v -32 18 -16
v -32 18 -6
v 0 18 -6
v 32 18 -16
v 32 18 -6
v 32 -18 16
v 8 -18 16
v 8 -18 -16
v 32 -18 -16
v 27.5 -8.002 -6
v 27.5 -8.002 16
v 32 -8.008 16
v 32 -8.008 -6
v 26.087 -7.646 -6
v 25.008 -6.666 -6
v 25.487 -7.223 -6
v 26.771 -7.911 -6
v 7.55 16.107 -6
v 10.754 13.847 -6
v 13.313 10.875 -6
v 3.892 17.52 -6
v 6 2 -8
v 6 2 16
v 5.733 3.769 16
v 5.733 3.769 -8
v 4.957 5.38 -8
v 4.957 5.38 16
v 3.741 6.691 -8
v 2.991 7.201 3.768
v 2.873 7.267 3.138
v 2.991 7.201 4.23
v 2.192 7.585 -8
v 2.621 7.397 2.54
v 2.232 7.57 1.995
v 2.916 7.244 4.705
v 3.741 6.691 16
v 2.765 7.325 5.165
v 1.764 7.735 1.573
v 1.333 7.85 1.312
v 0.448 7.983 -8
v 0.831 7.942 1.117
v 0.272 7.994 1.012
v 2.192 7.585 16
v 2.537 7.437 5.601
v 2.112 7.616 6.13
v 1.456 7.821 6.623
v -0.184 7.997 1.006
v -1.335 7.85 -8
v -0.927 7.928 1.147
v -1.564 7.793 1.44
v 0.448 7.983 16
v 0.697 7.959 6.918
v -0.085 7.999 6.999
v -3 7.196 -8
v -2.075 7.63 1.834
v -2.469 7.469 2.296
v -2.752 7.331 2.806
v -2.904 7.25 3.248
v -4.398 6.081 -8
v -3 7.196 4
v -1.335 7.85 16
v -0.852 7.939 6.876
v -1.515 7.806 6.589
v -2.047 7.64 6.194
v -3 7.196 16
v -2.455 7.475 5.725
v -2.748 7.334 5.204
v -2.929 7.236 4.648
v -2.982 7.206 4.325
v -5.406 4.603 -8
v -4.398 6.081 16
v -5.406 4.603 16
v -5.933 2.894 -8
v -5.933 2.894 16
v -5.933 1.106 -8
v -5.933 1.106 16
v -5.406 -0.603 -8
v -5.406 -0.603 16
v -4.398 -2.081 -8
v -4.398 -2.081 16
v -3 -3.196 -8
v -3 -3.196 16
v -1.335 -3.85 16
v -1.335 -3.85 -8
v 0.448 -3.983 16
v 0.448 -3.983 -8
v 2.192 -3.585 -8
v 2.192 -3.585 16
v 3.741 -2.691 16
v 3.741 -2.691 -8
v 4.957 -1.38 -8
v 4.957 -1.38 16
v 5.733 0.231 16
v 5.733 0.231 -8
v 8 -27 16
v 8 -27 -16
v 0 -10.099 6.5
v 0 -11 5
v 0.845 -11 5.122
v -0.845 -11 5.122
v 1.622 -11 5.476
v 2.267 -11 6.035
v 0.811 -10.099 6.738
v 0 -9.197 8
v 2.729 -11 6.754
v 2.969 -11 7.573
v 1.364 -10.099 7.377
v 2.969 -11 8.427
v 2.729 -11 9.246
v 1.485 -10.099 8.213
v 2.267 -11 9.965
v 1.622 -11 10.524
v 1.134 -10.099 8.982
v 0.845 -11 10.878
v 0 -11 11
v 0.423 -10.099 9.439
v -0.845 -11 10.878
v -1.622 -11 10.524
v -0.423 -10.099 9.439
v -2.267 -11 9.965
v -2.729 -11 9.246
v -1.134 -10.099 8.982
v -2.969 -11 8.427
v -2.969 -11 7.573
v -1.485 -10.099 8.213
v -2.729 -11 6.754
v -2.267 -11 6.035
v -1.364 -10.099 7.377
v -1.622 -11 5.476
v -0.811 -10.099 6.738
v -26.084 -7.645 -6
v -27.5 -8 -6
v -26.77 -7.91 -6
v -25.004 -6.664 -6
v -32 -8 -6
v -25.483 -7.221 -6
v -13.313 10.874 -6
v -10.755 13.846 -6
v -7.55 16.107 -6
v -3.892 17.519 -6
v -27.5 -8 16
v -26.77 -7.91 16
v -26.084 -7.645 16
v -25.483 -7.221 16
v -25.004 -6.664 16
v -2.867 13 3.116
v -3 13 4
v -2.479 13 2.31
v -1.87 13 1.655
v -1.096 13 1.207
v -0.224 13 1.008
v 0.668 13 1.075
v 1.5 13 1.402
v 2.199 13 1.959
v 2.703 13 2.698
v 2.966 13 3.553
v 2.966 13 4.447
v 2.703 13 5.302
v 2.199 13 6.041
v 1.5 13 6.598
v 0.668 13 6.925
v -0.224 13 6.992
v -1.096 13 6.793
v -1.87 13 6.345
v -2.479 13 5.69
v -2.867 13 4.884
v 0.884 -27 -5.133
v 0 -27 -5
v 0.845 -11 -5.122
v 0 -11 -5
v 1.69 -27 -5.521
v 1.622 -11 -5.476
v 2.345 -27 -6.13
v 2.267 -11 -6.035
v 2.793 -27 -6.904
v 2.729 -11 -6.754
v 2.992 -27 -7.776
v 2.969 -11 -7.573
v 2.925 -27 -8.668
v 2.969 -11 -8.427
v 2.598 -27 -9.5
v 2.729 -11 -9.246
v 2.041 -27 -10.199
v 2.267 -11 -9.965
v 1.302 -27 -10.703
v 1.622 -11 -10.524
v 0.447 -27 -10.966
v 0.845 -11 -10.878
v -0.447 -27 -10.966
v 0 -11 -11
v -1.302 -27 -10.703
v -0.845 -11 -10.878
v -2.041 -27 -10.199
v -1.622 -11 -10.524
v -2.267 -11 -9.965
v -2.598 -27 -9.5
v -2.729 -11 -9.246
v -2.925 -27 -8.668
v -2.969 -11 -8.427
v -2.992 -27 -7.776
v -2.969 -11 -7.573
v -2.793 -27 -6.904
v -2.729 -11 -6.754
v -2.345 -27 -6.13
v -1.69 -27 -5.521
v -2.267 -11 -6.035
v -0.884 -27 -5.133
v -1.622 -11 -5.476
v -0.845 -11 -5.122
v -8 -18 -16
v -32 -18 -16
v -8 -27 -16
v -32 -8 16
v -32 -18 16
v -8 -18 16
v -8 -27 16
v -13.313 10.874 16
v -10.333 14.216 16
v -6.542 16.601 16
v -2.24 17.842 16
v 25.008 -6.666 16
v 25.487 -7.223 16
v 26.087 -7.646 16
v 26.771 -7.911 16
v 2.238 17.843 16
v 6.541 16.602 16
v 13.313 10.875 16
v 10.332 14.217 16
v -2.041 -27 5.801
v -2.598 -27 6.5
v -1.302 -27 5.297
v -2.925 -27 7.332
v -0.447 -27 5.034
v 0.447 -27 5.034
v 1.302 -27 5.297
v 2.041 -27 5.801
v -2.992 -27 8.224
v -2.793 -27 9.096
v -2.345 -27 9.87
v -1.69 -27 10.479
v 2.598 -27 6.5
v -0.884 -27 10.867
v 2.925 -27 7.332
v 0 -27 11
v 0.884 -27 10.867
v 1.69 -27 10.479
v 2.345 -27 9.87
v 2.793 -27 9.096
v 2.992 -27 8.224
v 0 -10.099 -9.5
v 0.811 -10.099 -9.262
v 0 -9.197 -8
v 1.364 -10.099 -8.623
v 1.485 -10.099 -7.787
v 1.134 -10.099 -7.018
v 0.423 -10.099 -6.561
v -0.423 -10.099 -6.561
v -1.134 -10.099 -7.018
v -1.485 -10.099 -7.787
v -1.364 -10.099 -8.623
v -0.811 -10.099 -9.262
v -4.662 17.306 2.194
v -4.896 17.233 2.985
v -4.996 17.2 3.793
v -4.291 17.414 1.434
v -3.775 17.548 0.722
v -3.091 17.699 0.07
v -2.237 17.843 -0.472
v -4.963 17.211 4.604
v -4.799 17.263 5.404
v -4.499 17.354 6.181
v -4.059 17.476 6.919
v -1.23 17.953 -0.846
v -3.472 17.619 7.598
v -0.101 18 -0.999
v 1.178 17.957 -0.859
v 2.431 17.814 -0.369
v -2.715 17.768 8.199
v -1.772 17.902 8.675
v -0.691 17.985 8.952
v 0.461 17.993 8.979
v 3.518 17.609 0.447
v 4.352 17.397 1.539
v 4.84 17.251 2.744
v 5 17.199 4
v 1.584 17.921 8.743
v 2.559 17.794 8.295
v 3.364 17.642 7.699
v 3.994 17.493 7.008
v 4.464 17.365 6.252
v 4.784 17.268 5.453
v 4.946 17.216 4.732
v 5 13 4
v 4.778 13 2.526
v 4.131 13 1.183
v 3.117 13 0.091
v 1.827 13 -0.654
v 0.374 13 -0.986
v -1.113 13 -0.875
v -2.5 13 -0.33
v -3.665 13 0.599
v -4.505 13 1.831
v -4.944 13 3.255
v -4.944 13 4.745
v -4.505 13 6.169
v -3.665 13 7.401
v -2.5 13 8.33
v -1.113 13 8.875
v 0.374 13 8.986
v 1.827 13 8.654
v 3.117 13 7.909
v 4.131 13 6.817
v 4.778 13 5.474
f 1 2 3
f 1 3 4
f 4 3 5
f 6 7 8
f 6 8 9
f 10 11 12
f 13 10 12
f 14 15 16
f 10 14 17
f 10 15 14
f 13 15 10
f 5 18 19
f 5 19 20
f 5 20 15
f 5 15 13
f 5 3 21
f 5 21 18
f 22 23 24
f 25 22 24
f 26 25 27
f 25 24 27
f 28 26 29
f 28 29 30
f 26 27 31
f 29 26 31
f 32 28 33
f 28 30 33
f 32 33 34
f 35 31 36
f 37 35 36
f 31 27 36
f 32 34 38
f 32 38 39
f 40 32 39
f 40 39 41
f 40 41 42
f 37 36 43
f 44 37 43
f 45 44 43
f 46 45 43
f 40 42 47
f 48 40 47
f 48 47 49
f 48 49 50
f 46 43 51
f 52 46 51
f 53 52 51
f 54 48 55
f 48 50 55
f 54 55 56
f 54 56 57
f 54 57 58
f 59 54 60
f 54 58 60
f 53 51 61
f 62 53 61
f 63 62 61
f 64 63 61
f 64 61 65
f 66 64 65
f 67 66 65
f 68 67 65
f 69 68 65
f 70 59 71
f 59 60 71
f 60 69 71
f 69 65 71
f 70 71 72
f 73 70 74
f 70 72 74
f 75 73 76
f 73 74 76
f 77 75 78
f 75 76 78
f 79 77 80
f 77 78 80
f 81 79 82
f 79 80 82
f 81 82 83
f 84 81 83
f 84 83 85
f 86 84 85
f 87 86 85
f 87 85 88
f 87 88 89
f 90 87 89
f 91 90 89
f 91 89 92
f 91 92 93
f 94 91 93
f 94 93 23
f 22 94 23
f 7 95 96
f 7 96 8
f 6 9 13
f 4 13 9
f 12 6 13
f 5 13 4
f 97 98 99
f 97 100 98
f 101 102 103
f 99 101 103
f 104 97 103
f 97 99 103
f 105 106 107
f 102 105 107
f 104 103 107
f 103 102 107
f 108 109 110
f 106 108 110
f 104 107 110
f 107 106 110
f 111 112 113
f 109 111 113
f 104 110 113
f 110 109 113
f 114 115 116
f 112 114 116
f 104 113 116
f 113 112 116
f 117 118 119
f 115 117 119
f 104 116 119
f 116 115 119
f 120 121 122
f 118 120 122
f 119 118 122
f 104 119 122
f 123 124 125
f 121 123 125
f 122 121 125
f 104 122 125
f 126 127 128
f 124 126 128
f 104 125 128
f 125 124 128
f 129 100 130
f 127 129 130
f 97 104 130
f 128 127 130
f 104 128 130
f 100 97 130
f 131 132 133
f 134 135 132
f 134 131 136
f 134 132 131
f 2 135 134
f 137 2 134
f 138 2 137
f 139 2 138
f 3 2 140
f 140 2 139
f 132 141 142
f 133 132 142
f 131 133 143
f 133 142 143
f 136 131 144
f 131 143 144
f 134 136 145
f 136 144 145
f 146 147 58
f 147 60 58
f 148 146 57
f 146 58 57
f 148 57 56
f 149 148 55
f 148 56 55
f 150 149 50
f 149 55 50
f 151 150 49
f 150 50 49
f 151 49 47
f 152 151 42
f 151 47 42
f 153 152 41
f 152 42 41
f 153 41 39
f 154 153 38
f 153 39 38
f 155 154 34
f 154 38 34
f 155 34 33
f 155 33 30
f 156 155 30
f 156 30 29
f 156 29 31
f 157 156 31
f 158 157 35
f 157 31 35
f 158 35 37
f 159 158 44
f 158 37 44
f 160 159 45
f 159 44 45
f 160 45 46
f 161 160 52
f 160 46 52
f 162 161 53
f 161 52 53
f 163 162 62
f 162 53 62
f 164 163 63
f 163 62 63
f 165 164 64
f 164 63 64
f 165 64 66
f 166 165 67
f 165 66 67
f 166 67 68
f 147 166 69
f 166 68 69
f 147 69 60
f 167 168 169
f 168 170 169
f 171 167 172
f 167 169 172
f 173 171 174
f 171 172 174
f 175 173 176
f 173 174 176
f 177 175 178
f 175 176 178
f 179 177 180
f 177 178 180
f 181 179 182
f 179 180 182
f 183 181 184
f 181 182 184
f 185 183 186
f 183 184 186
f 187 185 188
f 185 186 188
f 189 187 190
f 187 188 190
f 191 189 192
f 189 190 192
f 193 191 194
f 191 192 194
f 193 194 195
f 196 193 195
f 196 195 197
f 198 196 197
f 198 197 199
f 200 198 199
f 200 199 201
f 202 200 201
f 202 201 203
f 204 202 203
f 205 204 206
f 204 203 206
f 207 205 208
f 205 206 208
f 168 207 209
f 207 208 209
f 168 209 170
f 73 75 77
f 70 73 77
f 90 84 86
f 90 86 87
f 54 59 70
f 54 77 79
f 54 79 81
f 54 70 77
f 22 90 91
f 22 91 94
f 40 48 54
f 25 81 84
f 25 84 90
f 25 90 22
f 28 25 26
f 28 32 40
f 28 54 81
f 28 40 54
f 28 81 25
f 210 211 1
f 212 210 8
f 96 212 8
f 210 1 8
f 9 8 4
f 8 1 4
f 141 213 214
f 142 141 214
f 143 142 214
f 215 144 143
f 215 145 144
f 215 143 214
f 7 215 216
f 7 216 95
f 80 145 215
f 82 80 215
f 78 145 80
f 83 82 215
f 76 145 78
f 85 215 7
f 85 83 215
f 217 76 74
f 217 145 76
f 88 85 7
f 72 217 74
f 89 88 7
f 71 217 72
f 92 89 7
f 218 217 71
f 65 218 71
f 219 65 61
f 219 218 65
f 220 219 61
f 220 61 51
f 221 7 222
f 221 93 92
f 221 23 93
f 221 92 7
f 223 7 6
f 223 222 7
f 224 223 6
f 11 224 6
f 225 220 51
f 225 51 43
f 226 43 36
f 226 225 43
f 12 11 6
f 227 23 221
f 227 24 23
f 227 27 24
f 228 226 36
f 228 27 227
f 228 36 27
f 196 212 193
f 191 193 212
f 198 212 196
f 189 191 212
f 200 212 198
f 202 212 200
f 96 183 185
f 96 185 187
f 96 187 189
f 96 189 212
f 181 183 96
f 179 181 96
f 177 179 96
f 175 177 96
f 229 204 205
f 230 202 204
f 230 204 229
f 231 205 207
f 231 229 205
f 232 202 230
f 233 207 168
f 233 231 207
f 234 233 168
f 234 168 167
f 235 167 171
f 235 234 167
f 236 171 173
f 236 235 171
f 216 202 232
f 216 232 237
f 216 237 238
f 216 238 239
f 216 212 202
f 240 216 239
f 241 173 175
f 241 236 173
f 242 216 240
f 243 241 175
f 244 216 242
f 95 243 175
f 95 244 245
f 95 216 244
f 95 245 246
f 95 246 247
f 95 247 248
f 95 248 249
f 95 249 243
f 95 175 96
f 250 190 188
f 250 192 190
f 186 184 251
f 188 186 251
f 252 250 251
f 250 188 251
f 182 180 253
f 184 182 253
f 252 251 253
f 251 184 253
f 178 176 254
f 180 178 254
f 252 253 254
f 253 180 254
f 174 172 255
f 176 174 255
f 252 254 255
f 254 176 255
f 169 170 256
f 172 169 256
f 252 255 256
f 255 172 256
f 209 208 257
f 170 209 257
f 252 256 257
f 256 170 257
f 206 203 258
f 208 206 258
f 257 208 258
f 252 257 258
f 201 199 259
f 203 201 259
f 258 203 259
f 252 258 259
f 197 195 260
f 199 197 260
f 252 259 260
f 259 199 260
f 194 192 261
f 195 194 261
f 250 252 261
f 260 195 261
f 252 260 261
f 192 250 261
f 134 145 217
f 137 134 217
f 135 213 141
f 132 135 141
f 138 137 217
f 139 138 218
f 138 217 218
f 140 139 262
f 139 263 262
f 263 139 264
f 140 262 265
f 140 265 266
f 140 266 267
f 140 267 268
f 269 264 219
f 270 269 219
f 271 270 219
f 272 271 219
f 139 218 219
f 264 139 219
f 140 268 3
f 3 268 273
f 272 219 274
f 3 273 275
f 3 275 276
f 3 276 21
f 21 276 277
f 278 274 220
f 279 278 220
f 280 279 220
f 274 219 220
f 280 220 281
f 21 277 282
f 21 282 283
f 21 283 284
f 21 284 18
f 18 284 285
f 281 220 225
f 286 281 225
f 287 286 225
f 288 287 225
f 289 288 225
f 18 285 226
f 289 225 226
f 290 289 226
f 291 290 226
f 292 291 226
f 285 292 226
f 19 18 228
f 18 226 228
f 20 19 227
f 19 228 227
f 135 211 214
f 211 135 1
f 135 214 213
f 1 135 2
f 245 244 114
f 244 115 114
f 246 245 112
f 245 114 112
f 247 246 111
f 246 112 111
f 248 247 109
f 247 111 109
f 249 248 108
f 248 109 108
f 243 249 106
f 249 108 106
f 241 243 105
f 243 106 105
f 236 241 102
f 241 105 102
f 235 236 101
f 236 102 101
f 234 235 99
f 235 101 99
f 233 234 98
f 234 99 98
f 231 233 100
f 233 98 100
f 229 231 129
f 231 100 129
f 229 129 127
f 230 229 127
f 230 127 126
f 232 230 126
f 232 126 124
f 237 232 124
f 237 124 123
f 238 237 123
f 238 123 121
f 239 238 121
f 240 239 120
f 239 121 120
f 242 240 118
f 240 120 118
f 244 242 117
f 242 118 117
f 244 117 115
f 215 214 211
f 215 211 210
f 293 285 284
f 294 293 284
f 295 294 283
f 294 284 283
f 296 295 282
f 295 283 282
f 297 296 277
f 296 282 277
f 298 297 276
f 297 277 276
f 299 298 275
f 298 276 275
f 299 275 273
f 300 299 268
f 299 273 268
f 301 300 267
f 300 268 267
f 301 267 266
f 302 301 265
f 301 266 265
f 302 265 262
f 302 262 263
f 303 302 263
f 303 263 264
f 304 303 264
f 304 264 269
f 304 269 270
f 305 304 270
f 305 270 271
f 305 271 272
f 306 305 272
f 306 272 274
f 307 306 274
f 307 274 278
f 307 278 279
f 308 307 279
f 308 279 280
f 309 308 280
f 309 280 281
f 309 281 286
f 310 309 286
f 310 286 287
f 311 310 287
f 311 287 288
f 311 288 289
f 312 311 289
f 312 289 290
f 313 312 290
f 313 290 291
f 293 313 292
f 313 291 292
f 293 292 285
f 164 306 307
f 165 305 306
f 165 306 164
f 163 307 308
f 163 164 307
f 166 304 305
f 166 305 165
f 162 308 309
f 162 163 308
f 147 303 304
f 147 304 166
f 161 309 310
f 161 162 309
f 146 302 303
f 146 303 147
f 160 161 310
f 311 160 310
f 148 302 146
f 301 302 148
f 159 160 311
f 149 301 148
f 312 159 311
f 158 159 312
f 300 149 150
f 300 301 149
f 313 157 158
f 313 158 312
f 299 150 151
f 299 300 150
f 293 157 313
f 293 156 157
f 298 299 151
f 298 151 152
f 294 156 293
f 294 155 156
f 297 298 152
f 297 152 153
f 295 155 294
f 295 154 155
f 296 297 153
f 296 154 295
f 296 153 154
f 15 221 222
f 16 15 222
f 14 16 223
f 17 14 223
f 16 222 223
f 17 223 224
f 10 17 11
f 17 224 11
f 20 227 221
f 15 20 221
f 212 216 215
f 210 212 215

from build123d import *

# Parameters (mm, degrees)
SKETCH1_W                               = 64
SKETCH1_H                               = 36
BOSS_EXTRUDE1_DEPTH                     = 16
CUT_EXTRUDE1_DEPTH                      = 22
SKETCH3_R                               = 6
CUT_EXTRUDE2_DEPTH                      = 24
SKETCH4_W                               = 16
SKETCH4_H                               = 9
BOSS_EXTRUDE3_DEPTH                     = 32
F_6_0MM_DOWEL_HOLE1_D                   = 6
F_6_0MM_DOWEL_HOLE1_DEPTH               = 16
F_6_0MM_DOWEL_HOLE1_TIP                 = 1.802581857
CBORE_FOR_M6_HEX_HEAD_BOLT2_D           = 6
CBORE_FOR_M6_HEX_HEAD_BOLT2_DEPTH       = 13
CBORE_FOR_M6_HEX_HEAD_BOLT2_CBORE_D     = 10
CBORE_FOR_M6_HEX_HEAD_BOLT2_CBORE_DEPTH = 5
CBORE_FOR_M6_HEX_HEAD_BOLT2_TIP         = 1.802581857


with BuildPart() as part:
    # Sketch1 → Boss-Extrude1 (new, symmetric)
    with BuildSketch(Plane.XY):
        Rectangle(SKETCH1_W, SKETCH1_H)
    extrude(amount=BOSS_EXTRUDE1_DEPTH, both=True)

    # Sketch2 → Cut-Extrude1 (cut)
    with BuildSketch(Plane.XY.offset(16)):
        with BuildLine():
            Line((-32, -8), (-27.499996562, -8))
            ThreePointArc((-27.499996562, -8), (-26.084327344, -7.644972715), (-25.003725591, -6.663920443))
            Line((-25.003725591, -6.663920443), (-13.313445176, 10.874242365))
            ThreePointArc((-13.313445176, 10.874242365), (-0.000751694, 17.999999982), (13.312611277, 10.875493281))
            Line((13.312611277, 10.875493281), (25.007578247, -6.666128828))
            ThreePointArc((25.007578247, -6.666128828), (26.086521715, -7.646142127), (27.500003403, -8.001971569))
            Line((27.500003403, -8.001971569), (32, -8.007505757))
            Line((32, -8.007505757), (36.662231921, -8.007505757))
            Line((36.662231921, -8.007505757), (36.662231921, 30.154585716))
            Line((36.662231921, 30.154585716), (-48.36652886, 30.154585716))
            Line((-48.36652886, 30.154585716), (-48.36652886, -8))
            Line((-48.36652886, -8), (-32, -8))
        make_face()
    extrude(amount=-CUT_EXTRUDE1_DEPTH, mode=Mode.SUBTRACT)

    # Sketch3 → Cut-Extrude2 (cut)
    with BuildSketch(Plane.XY.offset(16)):
        with Locations((0, 2)):
            Circle(SKETCH3_R)
    extrude(amount=-CUT_EXTRUDE2_DEPTH, mode=Mode.SUBTRACT)

    # Sketch4 → Boss-Extrude3 (add)
    with BuildSketch(Plane.XY.offset(16)):
        with Locations((0, -22.5)):
            Rectangle(SKETCH4_W, SKETCH4_H)
    extrude(amount=-BOSS_EXTRUDE3_DEPTH)

    # Ø6.0mm Dowel Hole1
    with Locations(Plane(origin=(0, -27, 8), x_dir=(0, 0, -1), z_dir=(0, -1, 0))):
        with Locations((0, 0), (16, 0)):
            Hole(F_6_0MM_DOWEL_HOLE1_D / 2, depth=F_6_0MM_DOWEL_HOLE1_DEPTH)
            with Locations((0, 0, -(F_6_0MM_DOWEL_HOLE1_DEPTH + F_6_0MM_DOWEL_HOLE1_TIP / 2))):  # 118° drill point
                Cone(0, F_6_0MM_DOWEL_HOLE1_D / 2, F_6_0MM_DOWEL_HOLE1_TIP, mode=Mode.SUBTRACT)

    # CBORE for M6 Hex Head Bolt2
    with Locations(Plane(origin=(0, 18, 0), x_dir=(1, 0, 0), z_dir=(0, 1, 0))):
        with Locations((0, -4)):
            CounterBoreHole(CBORE_FOR_M6_HEX_HEAD_BOLT2_D / 2, CBORE_FOR_M6_HEX_HEAD_BOLT2_CBORE_D / 2, CBORE_FOR_M6_HEX_HEAD_BOLT2_CBORE_DEPTH, depth=CBORE_FOR_M6_HEX_HEAD_BOLT2_DEPTH)
            with Locations((0, 0, -(CBORE_FOR_M6_HEX_HEAD_BOLT2_DEPTH + CBORE_FOR_M6_HEX_HEAD_BOLT2_TIP / 2))):  # 118° drill point
                Cone(0, CBORE_FOR_M6_HEX_HEAD_BOLT2_D / 2, CBORE_FOR_M6_HEX_HEAD_BOLT2_TIP, mode=Mode.SUBTRACT)


solid = part.part
